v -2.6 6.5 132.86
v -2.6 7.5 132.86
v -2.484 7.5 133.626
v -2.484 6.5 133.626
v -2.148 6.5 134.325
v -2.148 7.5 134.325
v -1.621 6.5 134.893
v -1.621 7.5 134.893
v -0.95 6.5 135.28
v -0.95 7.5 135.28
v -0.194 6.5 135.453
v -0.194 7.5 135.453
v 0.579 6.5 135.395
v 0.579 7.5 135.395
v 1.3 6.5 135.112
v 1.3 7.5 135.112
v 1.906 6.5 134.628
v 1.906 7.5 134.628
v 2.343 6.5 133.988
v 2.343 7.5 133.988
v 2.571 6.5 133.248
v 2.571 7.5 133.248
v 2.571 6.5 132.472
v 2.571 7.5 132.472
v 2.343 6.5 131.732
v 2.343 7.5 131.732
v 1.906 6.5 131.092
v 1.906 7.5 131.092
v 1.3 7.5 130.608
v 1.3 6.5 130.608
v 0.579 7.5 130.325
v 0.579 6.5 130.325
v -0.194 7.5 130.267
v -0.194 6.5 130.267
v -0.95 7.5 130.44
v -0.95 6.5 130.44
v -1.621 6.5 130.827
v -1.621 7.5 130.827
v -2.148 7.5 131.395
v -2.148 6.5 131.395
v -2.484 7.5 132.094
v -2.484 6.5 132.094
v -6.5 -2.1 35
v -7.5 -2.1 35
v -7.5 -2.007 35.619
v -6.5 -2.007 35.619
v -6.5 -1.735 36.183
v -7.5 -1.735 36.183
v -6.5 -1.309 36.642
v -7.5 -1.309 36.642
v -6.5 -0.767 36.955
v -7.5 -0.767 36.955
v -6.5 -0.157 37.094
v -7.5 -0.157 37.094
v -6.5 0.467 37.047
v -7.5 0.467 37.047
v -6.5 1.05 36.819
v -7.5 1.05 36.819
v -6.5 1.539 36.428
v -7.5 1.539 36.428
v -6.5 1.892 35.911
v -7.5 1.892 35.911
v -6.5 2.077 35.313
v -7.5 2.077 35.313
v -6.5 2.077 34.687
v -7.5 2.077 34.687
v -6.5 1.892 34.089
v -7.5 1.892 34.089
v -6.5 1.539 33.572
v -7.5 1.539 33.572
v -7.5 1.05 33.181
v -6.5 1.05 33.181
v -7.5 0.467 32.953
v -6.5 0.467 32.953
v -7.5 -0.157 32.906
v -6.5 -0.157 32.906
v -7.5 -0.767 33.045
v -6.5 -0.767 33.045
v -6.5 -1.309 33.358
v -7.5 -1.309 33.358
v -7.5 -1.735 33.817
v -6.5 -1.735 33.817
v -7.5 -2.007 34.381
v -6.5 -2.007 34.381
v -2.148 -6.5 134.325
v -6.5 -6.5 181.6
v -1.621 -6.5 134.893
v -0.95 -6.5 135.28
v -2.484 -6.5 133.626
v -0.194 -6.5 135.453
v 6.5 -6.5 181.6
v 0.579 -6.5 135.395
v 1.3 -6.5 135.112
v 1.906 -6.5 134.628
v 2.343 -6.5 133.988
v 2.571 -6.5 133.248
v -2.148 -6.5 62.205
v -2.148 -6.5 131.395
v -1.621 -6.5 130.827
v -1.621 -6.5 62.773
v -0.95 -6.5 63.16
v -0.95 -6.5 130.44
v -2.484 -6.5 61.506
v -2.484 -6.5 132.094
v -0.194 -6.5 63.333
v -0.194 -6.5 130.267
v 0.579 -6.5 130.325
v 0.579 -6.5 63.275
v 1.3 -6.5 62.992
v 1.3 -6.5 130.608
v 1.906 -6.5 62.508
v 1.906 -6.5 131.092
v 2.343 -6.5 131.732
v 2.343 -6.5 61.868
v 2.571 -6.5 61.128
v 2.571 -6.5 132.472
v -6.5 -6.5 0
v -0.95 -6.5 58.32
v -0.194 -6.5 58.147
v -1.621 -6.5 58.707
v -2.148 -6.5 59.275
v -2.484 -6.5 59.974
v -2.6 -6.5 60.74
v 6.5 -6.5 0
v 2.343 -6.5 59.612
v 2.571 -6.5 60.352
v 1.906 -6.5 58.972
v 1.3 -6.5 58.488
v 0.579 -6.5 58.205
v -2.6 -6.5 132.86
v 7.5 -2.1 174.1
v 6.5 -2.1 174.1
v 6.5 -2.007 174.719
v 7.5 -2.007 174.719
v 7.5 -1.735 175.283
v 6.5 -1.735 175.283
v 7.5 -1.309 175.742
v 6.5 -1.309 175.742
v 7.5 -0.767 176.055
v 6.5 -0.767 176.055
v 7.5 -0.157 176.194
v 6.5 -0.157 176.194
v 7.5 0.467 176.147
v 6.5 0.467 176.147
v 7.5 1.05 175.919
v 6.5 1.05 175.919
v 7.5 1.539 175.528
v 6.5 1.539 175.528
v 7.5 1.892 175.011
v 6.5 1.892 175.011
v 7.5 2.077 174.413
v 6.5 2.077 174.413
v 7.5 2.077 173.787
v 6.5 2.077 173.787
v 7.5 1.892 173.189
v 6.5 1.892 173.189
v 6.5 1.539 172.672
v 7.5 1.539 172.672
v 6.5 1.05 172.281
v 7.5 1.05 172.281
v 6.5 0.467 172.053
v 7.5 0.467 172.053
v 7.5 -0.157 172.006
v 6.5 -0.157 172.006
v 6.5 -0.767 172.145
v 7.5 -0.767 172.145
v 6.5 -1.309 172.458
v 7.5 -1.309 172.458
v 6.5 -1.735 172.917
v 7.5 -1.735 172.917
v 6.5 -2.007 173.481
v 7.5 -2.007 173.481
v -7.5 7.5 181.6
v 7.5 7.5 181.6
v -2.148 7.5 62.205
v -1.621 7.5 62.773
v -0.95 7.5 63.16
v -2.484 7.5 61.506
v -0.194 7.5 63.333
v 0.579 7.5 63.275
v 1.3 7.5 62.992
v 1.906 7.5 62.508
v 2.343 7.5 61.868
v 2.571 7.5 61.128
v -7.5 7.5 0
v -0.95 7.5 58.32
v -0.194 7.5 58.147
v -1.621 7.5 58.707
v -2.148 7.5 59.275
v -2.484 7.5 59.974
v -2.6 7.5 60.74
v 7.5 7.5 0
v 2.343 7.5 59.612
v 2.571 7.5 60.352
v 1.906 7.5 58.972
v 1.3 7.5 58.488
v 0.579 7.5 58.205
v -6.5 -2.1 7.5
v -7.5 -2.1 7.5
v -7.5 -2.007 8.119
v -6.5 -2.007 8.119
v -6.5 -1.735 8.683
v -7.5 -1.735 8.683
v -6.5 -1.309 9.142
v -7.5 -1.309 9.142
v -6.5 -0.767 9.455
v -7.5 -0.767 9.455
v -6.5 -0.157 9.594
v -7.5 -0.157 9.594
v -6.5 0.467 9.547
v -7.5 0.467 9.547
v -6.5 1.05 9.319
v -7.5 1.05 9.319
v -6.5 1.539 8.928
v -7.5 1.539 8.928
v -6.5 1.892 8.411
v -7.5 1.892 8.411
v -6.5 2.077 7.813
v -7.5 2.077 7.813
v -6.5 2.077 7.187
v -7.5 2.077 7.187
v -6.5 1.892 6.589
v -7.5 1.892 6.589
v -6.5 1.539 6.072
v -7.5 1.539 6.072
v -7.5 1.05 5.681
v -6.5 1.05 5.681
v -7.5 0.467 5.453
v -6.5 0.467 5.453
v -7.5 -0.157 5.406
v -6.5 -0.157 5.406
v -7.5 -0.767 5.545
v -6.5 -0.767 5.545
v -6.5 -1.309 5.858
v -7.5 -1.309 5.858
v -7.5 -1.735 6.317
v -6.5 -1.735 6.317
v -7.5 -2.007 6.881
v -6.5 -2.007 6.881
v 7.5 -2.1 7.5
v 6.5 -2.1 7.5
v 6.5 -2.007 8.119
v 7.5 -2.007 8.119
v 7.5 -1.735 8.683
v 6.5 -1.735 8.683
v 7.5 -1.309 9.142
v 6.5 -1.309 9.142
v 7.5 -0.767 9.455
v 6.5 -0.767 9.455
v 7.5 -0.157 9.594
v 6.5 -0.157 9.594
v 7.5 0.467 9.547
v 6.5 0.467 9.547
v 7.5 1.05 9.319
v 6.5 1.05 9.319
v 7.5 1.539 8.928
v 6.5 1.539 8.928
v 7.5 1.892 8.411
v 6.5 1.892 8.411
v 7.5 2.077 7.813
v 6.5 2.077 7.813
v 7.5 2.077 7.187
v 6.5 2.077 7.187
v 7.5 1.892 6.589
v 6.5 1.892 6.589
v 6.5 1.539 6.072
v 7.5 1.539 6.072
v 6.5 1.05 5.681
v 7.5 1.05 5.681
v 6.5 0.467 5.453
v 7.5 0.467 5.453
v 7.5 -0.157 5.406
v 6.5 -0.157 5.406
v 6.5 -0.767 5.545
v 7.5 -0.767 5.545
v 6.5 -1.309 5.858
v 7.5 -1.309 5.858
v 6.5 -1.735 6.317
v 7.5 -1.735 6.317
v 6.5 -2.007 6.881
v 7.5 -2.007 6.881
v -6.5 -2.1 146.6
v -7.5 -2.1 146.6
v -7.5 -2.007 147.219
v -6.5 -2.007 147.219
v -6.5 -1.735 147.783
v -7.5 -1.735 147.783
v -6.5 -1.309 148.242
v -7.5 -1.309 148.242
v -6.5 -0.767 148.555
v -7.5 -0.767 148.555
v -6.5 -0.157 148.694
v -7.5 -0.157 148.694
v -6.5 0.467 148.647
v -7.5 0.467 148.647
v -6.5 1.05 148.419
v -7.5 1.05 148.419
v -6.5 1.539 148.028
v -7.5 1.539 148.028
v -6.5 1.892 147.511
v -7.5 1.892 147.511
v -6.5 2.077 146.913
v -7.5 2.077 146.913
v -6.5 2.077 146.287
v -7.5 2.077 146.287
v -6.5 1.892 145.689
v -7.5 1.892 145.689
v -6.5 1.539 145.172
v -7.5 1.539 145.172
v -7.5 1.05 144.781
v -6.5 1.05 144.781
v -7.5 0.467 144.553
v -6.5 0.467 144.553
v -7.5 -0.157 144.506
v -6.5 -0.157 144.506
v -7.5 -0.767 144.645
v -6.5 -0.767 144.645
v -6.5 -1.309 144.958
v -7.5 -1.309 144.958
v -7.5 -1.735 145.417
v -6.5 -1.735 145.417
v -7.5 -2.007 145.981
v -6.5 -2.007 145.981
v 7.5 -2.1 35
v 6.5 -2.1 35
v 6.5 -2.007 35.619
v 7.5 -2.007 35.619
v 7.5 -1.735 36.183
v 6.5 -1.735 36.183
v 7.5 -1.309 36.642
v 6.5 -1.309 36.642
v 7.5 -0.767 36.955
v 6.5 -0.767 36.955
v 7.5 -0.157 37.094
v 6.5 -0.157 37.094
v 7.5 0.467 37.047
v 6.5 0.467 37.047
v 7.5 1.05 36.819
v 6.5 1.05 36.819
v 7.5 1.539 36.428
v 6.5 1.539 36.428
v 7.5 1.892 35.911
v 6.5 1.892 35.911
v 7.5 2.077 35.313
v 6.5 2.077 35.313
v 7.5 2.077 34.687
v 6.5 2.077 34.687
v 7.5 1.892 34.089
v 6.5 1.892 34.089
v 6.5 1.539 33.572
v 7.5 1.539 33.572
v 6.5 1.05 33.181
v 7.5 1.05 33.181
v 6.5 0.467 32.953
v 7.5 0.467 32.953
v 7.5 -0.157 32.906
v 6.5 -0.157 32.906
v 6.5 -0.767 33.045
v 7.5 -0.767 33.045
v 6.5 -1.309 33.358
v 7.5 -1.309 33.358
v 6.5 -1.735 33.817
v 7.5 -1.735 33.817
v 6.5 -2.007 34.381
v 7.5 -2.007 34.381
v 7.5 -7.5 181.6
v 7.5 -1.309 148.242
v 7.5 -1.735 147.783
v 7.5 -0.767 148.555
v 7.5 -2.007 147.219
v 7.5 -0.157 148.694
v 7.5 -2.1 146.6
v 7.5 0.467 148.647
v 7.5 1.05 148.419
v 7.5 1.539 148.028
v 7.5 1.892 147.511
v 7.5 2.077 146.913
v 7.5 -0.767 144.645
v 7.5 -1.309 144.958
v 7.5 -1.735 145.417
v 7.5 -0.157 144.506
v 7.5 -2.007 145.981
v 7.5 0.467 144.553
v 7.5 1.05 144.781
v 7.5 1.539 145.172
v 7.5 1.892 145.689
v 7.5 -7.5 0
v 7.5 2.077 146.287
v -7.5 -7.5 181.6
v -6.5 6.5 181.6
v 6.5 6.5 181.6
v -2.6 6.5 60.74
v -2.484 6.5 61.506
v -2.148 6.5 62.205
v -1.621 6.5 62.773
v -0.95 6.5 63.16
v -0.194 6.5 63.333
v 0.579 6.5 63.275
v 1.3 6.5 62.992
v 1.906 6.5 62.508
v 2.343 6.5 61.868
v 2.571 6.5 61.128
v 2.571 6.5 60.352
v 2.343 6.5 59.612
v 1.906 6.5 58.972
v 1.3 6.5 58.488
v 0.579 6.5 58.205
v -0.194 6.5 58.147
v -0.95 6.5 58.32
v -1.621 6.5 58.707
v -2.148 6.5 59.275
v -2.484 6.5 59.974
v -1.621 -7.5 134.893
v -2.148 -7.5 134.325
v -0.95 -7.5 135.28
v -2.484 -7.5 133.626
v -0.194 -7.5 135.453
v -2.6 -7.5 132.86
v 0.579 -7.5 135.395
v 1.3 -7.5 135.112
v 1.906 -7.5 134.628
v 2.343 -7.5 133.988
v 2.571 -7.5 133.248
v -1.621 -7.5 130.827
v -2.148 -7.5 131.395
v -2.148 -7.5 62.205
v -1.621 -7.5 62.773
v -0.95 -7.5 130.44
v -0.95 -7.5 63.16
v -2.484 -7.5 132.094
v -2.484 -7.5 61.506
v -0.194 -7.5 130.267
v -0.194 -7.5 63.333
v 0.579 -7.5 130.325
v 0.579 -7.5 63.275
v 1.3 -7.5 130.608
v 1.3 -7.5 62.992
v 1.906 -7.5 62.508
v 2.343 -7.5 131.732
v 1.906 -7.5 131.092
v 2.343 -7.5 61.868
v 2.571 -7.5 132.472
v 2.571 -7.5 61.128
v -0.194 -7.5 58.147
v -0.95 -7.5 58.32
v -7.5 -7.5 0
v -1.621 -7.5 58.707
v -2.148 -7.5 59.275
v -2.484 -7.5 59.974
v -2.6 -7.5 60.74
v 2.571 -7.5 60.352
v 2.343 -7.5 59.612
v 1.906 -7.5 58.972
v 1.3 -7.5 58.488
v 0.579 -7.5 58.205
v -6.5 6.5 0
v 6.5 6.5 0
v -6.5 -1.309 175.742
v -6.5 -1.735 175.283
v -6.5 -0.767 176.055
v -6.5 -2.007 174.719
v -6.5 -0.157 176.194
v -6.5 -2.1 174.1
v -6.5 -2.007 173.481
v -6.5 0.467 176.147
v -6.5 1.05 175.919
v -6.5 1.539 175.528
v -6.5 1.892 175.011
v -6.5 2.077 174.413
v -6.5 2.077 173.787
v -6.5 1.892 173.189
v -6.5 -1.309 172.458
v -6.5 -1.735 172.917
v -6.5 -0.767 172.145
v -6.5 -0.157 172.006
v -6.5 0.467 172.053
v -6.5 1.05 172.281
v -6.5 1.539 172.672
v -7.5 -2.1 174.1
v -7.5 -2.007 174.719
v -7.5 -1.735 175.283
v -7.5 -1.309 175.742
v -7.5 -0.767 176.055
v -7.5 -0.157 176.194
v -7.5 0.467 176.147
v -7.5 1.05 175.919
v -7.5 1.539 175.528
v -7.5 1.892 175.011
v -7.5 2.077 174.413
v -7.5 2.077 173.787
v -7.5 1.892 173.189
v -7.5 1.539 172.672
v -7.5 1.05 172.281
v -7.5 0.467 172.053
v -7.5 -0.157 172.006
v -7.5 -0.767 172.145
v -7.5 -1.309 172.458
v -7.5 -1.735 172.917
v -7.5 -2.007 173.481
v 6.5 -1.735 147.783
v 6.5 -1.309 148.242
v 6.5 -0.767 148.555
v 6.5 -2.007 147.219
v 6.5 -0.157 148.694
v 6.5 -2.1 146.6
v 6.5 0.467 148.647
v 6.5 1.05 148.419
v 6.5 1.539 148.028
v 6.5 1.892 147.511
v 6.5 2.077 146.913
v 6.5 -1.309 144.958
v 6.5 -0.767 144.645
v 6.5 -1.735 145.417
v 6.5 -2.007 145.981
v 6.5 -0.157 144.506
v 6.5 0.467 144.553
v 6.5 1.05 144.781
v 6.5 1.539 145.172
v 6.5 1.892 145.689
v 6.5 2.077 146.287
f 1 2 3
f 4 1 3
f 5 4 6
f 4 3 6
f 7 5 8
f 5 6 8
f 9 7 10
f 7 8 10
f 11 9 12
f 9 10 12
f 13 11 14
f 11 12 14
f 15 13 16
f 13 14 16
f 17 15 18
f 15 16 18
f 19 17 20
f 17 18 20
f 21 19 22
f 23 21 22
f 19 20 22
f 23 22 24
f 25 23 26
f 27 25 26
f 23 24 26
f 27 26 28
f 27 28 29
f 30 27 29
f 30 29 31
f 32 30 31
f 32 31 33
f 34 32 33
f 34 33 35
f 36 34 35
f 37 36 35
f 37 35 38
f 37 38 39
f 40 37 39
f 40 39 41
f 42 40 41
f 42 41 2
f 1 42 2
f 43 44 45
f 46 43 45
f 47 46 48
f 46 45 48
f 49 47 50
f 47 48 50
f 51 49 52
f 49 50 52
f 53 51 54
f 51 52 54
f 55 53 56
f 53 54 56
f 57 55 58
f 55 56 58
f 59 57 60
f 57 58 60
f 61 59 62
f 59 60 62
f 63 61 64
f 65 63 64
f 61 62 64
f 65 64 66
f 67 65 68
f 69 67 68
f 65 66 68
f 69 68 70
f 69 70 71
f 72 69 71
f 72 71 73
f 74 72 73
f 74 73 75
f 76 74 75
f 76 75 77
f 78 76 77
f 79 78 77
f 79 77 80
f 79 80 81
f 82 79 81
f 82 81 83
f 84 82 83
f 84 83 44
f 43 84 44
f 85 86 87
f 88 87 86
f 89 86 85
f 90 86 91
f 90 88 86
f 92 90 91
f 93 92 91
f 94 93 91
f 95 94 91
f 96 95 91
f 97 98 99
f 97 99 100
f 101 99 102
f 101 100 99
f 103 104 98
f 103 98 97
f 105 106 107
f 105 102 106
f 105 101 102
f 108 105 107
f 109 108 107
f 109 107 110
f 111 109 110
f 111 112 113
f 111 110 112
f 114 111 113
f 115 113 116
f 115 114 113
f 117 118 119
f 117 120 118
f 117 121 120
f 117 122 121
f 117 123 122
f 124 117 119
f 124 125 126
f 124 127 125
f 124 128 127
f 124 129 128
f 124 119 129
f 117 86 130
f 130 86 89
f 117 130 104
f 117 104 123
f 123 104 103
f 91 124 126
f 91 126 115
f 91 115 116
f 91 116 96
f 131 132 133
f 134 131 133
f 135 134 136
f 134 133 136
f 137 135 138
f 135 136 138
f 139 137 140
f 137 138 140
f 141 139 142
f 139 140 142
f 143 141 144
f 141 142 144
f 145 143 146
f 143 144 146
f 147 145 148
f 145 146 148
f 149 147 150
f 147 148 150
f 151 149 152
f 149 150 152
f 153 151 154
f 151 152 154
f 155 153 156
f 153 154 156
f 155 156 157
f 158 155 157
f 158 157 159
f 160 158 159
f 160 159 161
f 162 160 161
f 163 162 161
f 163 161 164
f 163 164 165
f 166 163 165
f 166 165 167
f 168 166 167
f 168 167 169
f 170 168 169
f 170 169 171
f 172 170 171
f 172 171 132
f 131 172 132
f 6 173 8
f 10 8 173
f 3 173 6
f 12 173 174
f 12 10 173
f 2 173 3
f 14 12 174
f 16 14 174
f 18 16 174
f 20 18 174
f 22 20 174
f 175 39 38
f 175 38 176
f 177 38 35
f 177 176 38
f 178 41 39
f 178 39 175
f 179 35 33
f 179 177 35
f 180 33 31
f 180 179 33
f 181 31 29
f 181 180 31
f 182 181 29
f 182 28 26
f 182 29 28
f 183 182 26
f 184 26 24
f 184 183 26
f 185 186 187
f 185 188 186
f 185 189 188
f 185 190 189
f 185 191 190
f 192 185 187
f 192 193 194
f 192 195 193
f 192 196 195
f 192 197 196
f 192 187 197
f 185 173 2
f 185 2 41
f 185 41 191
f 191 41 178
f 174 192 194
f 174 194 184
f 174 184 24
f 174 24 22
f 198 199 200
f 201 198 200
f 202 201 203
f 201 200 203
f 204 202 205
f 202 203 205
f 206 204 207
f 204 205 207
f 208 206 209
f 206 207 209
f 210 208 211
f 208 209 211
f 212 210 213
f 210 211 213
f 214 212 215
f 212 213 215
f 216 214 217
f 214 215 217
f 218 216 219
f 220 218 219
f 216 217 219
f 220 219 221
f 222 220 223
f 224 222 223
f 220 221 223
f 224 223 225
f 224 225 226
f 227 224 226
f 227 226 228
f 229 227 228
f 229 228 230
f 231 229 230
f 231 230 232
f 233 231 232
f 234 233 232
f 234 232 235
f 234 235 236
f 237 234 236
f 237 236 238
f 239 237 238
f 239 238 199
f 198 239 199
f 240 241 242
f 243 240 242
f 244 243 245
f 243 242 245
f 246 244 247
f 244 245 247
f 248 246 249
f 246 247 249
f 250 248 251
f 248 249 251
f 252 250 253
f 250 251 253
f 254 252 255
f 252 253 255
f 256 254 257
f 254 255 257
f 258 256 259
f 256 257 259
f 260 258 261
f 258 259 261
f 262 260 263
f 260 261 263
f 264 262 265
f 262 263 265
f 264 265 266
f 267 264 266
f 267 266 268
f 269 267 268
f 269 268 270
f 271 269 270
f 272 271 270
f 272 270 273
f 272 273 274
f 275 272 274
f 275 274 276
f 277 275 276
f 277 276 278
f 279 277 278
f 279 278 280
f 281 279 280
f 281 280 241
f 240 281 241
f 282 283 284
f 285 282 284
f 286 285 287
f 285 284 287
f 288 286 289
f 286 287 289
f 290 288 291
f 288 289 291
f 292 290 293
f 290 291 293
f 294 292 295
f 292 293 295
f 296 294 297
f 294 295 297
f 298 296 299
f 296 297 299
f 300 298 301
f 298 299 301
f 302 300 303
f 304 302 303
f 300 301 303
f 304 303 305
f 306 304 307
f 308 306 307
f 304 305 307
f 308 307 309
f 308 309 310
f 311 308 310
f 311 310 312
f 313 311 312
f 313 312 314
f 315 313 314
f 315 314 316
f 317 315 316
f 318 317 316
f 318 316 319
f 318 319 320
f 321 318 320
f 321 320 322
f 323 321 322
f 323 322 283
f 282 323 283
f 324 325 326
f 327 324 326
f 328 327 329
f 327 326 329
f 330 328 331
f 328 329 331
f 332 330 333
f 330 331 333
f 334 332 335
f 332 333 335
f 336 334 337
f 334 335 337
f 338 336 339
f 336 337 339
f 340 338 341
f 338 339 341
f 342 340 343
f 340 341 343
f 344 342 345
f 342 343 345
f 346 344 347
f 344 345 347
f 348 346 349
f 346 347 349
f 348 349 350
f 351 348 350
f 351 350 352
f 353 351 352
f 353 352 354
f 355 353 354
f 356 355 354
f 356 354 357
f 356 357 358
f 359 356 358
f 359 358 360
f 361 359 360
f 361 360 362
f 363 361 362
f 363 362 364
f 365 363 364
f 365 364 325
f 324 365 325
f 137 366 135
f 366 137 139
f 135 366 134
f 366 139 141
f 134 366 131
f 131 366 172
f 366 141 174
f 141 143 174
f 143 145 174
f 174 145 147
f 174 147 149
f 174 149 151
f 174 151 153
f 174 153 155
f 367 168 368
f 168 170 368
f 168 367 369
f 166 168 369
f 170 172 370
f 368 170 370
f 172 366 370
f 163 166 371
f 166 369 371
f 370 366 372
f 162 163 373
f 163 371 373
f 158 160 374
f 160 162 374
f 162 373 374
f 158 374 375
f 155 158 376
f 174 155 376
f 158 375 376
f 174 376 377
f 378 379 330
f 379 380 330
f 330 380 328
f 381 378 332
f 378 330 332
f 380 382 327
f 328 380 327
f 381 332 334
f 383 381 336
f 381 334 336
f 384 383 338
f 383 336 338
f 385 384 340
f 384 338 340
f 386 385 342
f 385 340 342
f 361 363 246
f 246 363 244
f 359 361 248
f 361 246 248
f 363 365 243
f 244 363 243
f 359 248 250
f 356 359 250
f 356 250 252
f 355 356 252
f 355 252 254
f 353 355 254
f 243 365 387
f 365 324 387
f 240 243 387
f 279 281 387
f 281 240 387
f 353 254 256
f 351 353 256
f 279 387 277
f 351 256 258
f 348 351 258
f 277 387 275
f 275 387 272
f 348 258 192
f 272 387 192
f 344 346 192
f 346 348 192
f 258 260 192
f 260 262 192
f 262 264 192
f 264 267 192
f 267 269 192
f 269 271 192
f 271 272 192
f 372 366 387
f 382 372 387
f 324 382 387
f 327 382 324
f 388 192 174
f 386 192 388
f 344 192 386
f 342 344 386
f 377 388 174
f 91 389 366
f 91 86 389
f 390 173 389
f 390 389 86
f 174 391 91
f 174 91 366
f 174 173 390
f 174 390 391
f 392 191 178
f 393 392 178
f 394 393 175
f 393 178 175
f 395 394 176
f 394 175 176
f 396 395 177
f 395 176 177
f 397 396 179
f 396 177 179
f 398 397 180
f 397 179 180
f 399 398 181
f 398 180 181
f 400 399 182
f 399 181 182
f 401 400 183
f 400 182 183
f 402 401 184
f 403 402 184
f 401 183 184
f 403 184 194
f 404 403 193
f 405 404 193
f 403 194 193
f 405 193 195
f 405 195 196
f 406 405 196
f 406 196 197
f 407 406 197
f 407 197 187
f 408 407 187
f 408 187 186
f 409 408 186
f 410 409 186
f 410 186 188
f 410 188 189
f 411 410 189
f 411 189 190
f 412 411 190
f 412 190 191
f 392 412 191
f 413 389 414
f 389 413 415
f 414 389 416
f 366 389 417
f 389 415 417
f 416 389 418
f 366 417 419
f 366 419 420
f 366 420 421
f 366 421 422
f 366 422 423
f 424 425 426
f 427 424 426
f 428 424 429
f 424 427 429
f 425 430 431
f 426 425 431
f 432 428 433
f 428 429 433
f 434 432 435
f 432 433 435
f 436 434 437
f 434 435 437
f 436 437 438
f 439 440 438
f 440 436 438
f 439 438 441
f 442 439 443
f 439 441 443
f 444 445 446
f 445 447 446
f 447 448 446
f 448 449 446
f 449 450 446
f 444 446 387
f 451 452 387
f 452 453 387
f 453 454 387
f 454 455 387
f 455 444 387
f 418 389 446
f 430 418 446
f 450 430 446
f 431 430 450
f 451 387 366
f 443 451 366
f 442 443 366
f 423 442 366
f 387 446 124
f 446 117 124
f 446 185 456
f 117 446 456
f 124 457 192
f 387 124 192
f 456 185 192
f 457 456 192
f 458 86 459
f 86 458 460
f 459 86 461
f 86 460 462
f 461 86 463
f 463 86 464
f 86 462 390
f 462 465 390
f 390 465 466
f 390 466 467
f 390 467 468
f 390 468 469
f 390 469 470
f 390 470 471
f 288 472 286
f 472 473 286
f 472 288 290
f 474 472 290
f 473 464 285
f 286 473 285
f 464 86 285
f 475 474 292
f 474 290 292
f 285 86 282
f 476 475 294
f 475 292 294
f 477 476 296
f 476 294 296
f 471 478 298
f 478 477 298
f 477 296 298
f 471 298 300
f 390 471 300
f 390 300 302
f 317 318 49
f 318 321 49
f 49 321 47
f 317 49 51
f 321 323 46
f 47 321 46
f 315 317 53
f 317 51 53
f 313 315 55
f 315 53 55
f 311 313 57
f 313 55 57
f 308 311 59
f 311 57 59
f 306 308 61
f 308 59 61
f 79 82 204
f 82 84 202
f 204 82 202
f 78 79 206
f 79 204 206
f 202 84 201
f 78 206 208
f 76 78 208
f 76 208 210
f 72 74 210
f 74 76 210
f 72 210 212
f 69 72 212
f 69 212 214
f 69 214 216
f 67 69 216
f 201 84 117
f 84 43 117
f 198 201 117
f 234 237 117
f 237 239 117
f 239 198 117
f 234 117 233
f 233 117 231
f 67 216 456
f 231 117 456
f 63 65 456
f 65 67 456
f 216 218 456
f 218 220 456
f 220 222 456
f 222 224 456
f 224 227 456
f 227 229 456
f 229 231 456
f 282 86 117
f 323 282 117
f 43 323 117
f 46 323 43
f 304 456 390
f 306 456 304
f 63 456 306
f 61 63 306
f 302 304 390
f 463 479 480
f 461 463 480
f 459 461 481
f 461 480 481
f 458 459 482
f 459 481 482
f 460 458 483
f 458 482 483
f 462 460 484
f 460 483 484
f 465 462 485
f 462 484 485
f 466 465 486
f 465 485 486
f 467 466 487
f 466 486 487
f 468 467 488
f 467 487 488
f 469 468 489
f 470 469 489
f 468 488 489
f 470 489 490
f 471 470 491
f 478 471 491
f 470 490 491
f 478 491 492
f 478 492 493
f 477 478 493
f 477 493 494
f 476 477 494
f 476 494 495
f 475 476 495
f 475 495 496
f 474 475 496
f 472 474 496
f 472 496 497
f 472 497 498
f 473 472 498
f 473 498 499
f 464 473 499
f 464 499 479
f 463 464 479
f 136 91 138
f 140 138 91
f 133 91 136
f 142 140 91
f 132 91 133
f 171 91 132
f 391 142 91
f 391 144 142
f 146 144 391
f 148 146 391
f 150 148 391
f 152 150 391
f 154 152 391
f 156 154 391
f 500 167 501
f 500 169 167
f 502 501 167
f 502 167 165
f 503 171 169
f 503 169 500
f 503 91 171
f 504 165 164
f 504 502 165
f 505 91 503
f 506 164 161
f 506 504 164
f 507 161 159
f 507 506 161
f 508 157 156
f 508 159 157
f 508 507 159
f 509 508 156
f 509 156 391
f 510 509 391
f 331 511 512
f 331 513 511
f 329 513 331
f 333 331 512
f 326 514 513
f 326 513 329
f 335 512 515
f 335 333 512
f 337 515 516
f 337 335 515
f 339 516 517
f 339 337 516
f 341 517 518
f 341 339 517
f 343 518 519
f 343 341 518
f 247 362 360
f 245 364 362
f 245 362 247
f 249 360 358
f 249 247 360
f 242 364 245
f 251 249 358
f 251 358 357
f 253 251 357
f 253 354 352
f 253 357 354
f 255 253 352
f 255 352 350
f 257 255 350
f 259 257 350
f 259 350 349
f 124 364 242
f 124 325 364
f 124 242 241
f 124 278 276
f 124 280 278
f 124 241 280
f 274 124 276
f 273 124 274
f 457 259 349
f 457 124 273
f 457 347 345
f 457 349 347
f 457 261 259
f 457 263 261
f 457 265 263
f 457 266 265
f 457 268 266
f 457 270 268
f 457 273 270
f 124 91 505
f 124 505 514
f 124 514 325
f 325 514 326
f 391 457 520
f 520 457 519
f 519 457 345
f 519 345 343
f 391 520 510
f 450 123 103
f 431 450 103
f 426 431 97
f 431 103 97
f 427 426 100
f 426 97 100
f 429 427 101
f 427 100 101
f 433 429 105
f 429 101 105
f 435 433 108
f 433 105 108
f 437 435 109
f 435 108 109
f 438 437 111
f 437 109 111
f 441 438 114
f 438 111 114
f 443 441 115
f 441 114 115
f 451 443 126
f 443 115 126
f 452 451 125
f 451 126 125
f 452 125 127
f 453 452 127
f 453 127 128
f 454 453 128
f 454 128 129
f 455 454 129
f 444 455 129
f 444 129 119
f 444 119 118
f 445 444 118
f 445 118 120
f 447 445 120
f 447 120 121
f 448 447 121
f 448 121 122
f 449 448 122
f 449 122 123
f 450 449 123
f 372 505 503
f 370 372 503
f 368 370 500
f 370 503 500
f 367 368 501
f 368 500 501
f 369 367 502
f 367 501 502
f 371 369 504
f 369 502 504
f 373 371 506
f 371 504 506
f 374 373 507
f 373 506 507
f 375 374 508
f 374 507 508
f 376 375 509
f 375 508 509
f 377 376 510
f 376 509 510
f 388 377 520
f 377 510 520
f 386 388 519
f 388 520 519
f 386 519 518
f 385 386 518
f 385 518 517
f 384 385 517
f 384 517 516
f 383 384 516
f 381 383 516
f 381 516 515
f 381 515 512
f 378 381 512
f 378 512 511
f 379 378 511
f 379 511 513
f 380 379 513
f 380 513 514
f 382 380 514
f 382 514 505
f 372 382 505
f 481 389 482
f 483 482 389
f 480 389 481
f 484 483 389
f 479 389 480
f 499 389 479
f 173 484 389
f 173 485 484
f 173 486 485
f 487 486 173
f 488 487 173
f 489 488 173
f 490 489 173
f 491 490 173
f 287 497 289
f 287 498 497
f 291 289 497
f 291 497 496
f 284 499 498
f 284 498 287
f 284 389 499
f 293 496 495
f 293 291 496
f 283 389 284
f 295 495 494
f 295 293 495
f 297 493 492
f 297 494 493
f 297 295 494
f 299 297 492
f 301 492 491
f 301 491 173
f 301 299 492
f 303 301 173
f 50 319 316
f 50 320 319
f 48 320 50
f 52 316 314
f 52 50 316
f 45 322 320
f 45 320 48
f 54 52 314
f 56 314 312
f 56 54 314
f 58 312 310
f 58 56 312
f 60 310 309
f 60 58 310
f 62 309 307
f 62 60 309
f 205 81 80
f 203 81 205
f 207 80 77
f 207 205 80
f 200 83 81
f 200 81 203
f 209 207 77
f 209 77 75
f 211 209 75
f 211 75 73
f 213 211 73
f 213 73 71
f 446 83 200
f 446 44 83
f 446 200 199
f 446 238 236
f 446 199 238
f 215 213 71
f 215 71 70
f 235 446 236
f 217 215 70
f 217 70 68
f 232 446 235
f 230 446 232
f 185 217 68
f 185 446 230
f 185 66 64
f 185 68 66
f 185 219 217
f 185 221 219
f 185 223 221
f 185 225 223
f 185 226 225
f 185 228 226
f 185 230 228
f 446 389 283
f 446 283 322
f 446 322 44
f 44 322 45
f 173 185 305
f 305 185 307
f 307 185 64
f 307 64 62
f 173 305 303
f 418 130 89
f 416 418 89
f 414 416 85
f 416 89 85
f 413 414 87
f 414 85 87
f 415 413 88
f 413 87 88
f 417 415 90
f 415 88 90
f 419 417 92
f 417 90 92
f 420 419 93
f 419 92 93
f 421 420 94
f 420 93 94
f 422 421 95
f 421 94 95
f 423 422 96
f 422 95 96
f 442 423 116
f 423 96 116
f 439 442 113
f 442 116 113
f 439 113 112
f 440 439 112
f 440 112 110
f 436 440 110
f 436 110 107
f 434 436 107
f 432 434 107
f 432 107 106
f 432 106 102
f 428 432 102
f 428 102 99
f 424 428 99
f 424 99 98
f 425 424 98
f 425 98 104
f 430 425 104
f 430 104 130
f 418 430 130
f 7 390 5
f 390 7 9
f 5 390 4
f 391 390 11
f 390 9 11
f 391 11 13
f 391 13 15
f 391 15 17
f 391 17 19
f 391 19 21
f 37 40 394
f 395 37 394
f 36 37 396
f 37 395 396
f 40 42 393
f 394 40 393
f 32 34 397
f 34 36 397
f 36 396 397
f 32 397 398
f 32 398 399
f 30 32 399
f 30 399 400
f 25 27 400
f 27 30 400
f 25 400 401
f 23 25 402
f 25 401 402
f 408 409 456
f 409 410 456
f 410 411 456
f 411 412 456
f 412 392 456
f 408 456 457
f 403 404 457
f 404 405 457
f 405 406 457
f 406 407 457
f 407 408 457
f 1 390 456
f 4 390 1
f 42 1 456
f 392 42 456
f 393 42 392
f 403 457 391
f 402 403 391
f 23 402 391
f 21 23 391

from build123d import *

# Parameters (mm, degrees)
SKETCH_1_W          = 15
SKETCH_1_H          = 15
SKETCH_1_W_2        = 13
SKETCH_1_H_2        = 13
EXTRUDE_1_DEPTH     = 181.6
SKETCH_2_R          = 2.6
CUT_EXTRUDE_1_DEPTH = 183.372722741
SKETCH_3_R          = 2.1
CUT_EXTRUDE_2_DEPTH = 183.372722741


with BuildPart() as part:
    # ｽｹｯﾁ1 → 押し出し-薄板1 (new body)
    with BuildSketch(Plane.XY):
        Rectangle(SKETCH_1_W, SKETCH_1_H)
        Rectangle(SKETCH_1_W_2, SKETCH_1_H_2, mode=Mode.SUBTRACT)
    extrude(amount=EXTRUDE_1_DEPTH)

    # ｽｹｯﾁ2 → ｶｯﾄ - 押し出し1 (cut, through all)
    with BuildSketch(Plane(origin=(0, 7.5, 0), x_dir=(1, 0, 0), z_dir=(0, 1, 0))):
        with Locations(Location((0, -132.86, 0), (0, 0, 180))):
            Circle(SKETCH_2_R)
        with Locations(Location((0, -60.74, 0), (0, 0, 180))):
            Circle(SKETCH_2_R)
    extrude(amount=-CUT_EXTRUDE_1_DEPTH, mode=Mode.SUBTRACT)

    # ｽｹｯﾁ3 → ｶｯﾄ - 押し出し2 (cut, through all)
    with BuildSketch(Plane.ZY.offset(7.5)):
        with Locations(Location((174.1, 0, 0), (0, 0, 270))):
            Circle(SKETCH_3_R)
        with Locations(Location((146.6, 0, 0), (0, 0, 270))):
            Circle(SKETCH_3_R)
        with Locations(Location((35, 0, 0), (0, 0, 270))):
            Circle(SKETCH_3_R)
        with Locations(Location((7.5, 0, 0), (0, 0, 270))):
            Circle(SKETCH_3_R)
    extrude(amount=-CUT_EXTRUDE_2_DEPTH, mode=Mode.SUBTRACT)


solid = part.part
